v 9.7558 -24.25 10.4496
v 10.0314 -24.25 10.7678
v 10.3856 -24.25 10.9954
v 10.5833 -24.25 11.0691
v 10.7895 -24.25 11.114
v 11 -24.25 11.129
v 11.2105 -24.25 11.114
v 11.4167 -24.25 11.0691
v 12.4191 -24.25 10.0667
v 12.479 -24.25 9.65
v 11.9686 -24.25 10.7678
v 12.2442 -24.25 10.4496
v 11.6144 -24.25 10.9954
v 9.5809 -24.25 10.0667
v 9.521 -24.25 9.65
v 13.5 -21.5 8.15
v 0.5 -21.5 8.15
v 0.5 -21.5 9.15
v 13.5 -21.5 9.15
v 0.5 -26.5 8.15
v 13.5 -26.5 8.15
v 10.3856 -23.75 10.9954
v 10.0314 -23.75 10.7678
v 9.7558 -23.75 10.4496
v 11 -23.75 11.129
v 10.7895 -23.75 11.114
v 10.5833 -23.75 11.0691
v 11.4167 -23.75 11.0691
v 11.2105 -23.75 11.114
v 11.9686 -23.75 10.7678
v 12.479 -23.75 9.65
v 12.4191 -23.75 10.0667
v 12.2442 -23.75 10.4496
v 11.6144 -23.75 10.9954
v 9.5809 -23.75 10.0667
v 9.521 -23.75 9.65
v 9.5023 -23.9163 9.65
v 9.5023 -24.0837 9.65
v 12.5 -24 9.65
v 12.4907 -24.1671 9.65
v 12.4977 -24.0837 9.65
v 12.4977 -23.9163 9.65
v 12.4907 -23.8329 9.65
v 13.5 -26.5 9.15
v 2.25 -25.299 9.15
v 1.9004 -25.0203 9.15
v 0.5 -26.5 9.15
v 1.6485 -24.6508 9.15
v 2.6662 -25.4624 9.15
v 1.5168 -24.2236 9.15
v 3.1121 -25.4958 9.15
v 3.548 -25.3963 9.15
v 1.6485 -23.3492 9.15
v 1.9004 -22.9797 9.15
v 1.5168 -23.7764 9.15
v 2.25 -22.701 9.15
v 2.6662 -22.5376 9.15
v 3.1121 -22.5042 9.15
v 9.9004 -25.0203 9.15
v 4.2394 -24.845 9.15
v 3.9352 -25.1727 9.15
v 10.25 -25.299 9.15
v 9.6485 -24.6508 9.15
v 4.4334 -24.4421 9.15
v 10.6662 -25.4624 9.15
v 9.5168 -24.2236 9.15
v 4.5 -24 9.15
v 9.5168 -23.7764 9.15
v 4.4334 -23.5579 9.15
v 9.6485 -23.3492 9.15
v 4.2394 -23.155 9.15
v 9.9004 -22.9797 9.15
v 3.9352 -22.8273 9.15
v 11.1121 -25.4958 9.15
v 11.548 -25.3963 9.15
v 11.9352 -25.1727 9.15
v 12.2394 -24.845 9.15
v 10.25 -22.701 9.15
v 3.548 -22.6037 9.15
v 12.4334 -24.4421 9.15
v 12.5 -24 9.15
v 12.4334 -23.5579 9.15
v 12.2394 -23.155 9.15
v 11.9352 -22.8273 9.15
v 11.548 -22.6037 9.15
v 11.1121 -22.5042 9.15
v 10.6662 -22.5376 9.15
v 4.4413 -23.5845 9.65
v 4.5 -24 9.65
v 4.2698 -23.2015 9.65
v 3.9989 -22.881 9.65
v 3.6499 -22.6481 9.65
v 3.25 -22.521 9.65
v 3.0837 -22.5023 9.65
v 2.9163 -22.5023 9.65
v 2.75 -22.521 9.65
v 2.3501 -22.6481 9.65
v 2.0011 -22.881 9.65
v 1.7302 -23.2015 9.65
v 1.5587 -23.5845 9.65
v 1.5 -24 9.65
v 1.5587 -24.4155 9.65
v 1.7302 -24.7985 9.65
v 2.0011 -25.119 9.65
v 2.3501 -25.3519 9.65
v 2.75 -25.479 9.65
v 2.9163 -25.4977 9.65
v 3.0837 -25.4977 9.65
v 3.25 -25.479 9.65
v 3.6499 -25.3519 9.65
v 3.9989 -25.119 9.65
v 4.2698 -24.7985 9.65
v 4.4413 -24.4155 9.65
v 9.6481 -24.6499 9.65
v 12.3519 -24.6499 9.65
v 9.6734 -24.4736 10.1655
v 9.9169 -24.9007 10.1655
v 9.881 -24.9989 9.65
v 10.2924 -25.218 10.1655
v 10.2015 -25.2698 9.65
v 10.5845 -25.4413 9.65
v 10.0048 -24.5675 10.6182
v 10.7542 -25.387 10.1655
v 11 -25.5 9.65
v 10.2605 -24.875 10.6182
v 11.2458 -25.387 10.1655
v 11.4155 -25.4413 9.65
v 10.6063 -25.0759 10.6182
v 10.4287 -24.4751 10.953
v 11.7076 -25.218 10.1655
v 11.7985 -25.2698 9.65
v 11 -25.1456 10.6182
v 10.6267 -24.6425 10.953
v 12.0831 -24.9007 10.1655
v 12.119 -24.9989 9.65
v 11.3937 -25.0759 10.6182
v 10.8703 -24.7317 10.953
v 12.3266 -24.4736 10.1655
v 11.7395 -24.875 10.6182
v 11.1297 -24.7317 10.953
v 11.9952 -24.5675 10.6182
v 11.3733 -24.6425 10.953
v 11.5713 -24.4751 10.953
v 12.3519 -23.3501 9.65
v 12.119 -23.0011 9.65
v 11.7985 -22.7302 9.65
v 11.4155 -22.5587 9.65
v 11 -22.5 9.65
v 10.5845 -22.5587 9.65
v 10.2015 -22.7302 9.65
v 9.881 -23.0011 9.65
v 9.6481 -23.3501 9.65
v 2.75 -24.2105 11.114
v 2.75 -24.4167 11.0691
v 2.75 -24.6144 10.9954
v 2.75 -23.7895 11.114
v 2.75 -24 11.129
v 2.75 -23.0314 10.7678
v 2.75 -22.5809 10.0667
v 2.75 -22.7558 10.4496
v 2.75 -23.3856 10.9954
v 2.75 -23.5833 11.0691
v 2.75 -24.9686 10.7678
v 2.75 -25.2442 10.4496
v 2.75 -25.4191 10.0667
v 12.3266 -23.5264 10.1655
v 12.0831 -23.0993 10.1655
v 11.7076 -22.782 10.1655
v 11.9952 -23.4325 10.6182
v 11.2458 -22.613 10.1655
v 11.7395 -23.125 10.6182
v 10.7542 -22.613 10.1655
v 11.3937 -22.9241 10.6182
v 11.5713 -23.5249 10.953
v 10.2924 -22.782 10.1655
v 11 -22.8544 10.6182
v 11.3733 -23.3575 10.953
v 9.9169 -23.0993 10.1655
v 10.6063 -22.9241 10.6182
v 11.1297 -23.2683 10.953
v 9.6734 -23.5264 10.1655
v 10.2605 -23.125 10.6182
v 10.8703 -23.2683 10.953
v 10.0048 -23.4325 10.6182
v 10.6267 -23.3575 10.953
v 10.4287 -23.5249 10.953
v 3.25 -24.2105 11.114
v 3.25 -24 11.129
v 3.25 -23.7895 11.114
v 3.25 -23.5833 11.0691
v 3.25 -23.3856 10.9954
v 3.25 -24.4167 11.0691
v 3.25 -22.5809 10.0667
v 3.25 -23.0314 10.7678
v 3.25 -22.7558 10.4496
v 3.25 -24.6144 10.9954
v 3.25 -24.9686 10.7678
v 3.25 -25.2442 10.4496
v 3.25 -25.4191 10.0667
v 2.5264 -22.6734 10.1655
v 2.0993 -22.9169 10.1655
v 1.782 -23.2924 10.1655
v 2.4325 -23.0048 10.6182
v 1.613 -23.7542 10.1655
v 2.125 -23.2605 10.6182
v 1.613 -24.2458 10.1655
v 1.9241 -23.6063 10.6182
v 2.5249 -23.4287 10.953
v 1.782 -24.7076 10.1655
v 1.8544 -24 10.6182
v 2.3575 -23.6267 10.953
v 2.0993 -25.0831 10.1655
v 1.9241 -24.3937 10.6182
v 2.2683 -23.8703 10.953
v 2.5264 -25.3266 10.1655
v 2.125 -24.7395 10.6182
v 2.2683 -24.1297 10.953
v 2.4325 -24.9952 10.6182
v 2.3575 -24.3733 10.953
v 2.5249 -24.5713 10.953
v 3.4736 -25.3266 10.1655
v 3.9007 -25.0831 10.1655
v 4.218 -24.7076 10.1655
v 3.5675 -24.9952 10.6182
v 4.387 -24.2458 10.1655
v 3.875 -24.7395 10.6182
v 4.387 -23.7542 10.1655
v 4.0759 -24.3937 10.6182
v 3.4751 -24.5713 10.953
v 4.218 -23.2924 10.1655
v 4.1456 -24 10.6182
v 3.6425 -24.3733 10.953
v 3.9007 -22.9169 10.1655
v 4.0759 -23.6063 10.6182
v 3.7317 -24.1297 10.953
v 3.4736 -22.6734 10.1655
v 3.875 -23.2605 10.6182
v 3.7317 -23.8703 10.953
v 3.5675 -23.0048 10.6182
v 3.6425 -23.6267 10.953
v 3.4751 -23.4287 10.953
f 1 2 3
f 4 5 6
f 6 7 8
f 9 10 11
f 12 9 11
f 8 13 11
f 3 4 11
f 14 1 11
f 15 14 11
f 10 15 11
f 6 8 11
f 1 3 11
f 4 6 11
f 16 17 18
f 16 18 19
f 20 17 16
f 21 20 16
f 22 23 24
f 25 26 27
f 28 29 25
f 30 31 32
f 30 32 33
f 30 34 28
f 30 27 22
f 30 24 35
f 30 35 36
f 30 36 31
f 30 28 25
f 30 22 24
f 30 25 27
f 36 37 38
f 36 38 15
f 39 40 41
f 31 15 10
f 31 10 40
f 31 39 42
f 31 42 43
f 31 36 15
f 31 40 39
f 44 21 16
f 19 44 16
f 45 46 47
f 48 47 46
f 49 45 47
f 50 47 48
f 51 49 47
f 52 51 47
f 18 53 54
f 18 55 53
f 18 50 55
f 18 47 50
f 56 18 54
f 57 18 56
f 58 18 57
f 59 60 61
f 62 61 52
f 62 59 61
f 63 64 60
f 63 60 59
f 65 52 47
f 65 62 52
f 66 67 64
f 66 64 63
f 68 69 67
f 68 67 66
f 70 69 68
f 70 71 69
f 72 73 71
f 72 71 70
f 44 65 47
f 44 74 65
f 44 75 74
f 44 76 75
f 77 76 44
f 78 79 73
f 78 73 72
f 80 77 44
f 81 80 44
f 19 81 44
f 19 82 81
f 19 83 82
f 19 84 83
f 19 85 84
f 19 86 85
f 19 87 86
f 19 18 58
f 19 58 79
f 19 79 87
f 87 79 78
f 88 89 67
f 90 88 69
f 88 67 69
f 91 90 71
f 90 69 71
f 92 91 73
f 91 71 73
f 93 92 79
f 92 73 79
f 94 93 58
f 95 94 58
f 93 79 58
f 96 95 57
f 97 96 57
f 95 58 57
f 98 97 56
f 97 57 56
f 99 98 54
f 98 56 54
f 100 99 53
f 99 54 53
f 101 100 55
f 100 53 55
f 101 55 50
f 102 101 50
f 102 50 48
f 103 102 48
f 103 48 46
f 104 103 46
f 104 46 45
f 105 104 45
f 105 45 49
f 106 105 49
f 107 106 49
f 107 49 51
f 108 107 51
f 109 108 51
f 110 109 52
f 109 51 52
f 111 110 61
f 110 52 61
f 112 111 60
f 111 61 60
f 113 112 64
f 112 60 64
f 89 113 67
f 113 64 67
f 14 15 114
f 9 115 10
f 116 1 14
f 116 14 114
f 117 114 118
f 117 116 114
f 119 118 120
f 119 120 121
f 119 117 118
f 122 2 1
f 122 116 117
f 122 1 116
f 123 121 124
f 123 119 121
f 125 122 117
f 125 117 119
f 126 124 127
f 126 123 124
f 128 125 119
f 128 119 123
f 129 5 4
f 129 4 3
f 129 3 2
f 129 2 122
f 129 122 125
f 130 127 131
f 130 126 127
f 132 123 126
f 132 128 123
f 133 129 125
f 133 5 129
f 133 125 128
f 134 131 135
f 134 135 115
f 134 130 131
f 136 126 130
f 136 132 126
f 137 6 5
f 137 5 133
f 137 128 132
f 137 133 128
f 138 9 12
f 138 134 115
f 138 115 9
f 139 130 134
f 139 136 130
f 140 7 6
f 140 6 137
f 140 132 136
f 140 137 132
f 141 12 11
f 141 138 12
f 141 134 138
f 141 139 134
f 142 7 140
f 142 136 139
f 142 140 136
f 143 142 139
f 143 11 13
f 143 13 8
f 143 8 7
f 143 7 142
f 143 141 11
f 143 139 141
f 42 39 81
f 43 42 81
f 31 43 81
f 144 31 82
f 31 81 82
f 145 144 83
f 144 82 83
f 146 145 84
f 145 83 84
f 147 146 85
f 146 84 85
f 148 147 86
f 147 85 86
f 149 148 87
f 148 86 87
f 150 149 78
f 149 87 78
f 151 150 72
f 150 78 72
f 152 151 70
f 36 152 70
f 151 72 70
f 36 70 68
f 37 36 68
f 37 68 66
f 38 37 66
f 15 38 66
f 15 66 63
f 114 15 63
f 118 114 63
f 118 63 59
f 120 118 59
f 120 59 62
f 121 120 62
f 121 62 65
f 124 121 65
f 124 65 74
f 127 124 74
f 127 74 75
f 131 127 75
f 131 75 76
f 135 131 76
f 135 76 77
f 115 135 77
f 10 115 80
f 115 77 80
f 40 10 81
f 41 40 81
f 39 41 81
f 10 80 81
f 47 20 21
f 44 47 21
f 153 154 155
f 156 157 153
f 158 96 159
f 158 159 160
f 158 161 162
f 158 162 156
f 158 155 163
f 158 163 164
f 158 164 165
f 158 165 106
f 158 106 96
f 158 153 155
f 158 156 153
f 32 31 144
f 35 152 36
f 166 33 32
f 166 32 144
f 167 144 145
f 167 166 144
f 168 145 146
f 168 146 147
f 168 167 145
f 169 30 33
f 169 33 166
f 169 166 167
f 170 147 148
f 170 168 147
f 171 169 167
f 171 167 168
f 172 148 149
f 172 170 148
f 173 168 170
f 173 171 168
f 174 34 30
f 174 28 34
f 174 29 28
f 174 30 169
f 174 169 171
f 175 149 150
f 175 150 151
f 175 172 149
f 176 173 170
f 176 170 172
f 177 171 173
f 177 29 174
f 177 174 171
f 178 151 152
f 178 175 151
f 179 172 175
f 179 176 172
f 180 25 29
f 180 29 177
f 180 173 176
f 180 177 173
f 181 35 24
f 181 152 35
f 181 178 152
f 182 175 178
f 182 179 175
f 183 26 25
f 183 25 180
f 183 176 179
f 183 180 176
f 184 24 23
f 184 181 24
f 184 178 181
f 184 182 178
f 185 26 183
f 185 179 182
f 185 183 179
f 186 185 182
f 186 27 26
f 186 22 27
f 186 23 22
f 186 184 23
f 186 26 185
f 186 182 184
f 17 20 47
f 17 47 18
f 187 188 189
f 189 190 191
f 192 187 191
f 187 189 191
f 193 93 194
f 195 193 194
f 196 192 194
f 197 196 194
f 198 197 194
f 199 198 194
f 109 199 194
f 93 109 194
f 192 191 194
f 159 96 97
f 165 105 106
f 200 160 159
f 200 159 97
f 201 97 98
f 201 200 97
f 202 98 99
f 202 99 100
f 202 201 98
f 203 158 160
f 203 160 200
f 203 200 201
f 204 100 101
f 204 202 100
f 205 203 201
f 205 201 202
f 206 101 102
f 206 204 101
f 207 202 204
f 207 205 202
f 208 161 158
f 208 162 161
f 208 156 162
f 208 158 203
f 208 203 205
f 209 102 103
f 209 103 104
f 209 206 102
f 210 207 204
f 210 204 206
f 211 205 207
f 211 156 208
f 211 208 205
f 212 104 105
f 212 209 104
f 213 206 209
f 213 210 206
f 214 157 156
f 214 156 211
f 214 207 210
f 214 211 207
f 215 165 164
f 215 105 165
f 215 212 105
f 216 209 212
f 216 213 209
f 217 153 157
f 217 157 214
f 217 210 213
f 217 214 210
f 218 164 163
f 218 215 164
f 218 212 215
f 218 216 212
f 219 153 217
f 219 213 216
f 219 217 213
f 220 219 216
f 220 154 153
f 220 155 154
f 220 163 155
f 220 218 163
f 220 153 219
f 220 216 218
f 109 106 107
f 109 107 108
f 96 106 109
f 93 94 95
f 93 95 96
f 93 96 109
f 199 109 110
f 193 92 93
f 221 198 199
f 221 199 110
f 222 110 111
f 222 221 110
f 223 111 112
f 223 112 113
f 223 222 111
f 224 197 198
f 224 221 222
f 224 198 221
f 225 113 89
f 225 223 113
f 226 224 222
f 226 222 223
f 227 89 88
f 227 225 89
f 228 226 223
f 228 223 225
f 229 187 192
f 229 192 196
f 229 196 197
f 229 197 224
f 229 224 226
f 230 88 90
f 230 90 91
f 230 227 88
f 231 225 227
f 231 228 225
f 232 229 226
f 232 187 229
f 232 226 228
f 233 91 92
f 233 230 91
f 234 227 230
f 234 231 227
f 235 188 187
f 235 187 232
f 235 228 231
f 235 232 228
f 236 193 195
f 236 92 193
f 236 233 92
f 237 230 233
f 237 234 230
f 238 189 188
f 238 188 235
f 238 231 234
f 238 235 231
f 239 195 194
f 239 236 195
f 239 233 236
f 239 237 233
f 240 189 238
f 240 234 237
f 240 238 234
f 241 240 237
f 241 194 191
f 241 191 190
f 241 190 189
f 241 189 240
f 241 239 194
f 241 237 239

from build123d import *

# Parameters (mm, degrees)
SKETCH074_W     = 13
SKETCH074_H     = 5
PAD037_DEPTH    = 1
SKETCH070_R     = 1.5
PAD038_DEPTH    = 2
FILLET010_R     = 1.5
SKETCH073_W     = 0.5
SKETCH073_H     = 4
SKETCH073_W_2   = 4
SKETCH073_H_2   = 0.5
POCKET025_DEPTH = 1.5


with BuildPart() as part:
    # Sketch074 (on Face1 of CopyPocket001) → Pad037 (new body)
    with BuildSketch(Plane.XY.offset(8.15)):
        with Locations((7, -24)):
            Rectangle(SKETCH074_W, SKETCH074_H)
    extrude(amount=PAD037_DEPTH)

    # Sketch070 (on Face6 of Pad037) → Pad038 (join)
    with BuildSketch(Plane.XY.offset(9.15)):
        with Locations((3, -24)):
            Circle(SKETCH070_R)
        with Locations((11, -24)):
            Circle(SKETCH070_R)
    extrude(amount=PAD038_DEPTH)

    # Fillet010
    fillet010_edges = [part.edges().sort_by_distance(p)[0] for p in [
        (9.5, -24, 11.15),
        (1.5, -24, 11.15),
    ]]
    fillet(fillet010_edges, radius=FILLET010_R)

    # Sketch073 (on Face12 of Fillet010) → Pocket025 (cut)
    with BuildSketch(Plane.XY.offset(11.15)):
        with Locations((3, -24)):
            Rectangle(SKETCH073_W, SKETCH073_H)
        with Locations((11, -24)):
            Rectangle(SKETCH073_W_2, SKETCH073_H_2)
    extrude(amount=-POCKET025_DEPTH, mode=Mode.SUBTRACT)


solid = part.part
